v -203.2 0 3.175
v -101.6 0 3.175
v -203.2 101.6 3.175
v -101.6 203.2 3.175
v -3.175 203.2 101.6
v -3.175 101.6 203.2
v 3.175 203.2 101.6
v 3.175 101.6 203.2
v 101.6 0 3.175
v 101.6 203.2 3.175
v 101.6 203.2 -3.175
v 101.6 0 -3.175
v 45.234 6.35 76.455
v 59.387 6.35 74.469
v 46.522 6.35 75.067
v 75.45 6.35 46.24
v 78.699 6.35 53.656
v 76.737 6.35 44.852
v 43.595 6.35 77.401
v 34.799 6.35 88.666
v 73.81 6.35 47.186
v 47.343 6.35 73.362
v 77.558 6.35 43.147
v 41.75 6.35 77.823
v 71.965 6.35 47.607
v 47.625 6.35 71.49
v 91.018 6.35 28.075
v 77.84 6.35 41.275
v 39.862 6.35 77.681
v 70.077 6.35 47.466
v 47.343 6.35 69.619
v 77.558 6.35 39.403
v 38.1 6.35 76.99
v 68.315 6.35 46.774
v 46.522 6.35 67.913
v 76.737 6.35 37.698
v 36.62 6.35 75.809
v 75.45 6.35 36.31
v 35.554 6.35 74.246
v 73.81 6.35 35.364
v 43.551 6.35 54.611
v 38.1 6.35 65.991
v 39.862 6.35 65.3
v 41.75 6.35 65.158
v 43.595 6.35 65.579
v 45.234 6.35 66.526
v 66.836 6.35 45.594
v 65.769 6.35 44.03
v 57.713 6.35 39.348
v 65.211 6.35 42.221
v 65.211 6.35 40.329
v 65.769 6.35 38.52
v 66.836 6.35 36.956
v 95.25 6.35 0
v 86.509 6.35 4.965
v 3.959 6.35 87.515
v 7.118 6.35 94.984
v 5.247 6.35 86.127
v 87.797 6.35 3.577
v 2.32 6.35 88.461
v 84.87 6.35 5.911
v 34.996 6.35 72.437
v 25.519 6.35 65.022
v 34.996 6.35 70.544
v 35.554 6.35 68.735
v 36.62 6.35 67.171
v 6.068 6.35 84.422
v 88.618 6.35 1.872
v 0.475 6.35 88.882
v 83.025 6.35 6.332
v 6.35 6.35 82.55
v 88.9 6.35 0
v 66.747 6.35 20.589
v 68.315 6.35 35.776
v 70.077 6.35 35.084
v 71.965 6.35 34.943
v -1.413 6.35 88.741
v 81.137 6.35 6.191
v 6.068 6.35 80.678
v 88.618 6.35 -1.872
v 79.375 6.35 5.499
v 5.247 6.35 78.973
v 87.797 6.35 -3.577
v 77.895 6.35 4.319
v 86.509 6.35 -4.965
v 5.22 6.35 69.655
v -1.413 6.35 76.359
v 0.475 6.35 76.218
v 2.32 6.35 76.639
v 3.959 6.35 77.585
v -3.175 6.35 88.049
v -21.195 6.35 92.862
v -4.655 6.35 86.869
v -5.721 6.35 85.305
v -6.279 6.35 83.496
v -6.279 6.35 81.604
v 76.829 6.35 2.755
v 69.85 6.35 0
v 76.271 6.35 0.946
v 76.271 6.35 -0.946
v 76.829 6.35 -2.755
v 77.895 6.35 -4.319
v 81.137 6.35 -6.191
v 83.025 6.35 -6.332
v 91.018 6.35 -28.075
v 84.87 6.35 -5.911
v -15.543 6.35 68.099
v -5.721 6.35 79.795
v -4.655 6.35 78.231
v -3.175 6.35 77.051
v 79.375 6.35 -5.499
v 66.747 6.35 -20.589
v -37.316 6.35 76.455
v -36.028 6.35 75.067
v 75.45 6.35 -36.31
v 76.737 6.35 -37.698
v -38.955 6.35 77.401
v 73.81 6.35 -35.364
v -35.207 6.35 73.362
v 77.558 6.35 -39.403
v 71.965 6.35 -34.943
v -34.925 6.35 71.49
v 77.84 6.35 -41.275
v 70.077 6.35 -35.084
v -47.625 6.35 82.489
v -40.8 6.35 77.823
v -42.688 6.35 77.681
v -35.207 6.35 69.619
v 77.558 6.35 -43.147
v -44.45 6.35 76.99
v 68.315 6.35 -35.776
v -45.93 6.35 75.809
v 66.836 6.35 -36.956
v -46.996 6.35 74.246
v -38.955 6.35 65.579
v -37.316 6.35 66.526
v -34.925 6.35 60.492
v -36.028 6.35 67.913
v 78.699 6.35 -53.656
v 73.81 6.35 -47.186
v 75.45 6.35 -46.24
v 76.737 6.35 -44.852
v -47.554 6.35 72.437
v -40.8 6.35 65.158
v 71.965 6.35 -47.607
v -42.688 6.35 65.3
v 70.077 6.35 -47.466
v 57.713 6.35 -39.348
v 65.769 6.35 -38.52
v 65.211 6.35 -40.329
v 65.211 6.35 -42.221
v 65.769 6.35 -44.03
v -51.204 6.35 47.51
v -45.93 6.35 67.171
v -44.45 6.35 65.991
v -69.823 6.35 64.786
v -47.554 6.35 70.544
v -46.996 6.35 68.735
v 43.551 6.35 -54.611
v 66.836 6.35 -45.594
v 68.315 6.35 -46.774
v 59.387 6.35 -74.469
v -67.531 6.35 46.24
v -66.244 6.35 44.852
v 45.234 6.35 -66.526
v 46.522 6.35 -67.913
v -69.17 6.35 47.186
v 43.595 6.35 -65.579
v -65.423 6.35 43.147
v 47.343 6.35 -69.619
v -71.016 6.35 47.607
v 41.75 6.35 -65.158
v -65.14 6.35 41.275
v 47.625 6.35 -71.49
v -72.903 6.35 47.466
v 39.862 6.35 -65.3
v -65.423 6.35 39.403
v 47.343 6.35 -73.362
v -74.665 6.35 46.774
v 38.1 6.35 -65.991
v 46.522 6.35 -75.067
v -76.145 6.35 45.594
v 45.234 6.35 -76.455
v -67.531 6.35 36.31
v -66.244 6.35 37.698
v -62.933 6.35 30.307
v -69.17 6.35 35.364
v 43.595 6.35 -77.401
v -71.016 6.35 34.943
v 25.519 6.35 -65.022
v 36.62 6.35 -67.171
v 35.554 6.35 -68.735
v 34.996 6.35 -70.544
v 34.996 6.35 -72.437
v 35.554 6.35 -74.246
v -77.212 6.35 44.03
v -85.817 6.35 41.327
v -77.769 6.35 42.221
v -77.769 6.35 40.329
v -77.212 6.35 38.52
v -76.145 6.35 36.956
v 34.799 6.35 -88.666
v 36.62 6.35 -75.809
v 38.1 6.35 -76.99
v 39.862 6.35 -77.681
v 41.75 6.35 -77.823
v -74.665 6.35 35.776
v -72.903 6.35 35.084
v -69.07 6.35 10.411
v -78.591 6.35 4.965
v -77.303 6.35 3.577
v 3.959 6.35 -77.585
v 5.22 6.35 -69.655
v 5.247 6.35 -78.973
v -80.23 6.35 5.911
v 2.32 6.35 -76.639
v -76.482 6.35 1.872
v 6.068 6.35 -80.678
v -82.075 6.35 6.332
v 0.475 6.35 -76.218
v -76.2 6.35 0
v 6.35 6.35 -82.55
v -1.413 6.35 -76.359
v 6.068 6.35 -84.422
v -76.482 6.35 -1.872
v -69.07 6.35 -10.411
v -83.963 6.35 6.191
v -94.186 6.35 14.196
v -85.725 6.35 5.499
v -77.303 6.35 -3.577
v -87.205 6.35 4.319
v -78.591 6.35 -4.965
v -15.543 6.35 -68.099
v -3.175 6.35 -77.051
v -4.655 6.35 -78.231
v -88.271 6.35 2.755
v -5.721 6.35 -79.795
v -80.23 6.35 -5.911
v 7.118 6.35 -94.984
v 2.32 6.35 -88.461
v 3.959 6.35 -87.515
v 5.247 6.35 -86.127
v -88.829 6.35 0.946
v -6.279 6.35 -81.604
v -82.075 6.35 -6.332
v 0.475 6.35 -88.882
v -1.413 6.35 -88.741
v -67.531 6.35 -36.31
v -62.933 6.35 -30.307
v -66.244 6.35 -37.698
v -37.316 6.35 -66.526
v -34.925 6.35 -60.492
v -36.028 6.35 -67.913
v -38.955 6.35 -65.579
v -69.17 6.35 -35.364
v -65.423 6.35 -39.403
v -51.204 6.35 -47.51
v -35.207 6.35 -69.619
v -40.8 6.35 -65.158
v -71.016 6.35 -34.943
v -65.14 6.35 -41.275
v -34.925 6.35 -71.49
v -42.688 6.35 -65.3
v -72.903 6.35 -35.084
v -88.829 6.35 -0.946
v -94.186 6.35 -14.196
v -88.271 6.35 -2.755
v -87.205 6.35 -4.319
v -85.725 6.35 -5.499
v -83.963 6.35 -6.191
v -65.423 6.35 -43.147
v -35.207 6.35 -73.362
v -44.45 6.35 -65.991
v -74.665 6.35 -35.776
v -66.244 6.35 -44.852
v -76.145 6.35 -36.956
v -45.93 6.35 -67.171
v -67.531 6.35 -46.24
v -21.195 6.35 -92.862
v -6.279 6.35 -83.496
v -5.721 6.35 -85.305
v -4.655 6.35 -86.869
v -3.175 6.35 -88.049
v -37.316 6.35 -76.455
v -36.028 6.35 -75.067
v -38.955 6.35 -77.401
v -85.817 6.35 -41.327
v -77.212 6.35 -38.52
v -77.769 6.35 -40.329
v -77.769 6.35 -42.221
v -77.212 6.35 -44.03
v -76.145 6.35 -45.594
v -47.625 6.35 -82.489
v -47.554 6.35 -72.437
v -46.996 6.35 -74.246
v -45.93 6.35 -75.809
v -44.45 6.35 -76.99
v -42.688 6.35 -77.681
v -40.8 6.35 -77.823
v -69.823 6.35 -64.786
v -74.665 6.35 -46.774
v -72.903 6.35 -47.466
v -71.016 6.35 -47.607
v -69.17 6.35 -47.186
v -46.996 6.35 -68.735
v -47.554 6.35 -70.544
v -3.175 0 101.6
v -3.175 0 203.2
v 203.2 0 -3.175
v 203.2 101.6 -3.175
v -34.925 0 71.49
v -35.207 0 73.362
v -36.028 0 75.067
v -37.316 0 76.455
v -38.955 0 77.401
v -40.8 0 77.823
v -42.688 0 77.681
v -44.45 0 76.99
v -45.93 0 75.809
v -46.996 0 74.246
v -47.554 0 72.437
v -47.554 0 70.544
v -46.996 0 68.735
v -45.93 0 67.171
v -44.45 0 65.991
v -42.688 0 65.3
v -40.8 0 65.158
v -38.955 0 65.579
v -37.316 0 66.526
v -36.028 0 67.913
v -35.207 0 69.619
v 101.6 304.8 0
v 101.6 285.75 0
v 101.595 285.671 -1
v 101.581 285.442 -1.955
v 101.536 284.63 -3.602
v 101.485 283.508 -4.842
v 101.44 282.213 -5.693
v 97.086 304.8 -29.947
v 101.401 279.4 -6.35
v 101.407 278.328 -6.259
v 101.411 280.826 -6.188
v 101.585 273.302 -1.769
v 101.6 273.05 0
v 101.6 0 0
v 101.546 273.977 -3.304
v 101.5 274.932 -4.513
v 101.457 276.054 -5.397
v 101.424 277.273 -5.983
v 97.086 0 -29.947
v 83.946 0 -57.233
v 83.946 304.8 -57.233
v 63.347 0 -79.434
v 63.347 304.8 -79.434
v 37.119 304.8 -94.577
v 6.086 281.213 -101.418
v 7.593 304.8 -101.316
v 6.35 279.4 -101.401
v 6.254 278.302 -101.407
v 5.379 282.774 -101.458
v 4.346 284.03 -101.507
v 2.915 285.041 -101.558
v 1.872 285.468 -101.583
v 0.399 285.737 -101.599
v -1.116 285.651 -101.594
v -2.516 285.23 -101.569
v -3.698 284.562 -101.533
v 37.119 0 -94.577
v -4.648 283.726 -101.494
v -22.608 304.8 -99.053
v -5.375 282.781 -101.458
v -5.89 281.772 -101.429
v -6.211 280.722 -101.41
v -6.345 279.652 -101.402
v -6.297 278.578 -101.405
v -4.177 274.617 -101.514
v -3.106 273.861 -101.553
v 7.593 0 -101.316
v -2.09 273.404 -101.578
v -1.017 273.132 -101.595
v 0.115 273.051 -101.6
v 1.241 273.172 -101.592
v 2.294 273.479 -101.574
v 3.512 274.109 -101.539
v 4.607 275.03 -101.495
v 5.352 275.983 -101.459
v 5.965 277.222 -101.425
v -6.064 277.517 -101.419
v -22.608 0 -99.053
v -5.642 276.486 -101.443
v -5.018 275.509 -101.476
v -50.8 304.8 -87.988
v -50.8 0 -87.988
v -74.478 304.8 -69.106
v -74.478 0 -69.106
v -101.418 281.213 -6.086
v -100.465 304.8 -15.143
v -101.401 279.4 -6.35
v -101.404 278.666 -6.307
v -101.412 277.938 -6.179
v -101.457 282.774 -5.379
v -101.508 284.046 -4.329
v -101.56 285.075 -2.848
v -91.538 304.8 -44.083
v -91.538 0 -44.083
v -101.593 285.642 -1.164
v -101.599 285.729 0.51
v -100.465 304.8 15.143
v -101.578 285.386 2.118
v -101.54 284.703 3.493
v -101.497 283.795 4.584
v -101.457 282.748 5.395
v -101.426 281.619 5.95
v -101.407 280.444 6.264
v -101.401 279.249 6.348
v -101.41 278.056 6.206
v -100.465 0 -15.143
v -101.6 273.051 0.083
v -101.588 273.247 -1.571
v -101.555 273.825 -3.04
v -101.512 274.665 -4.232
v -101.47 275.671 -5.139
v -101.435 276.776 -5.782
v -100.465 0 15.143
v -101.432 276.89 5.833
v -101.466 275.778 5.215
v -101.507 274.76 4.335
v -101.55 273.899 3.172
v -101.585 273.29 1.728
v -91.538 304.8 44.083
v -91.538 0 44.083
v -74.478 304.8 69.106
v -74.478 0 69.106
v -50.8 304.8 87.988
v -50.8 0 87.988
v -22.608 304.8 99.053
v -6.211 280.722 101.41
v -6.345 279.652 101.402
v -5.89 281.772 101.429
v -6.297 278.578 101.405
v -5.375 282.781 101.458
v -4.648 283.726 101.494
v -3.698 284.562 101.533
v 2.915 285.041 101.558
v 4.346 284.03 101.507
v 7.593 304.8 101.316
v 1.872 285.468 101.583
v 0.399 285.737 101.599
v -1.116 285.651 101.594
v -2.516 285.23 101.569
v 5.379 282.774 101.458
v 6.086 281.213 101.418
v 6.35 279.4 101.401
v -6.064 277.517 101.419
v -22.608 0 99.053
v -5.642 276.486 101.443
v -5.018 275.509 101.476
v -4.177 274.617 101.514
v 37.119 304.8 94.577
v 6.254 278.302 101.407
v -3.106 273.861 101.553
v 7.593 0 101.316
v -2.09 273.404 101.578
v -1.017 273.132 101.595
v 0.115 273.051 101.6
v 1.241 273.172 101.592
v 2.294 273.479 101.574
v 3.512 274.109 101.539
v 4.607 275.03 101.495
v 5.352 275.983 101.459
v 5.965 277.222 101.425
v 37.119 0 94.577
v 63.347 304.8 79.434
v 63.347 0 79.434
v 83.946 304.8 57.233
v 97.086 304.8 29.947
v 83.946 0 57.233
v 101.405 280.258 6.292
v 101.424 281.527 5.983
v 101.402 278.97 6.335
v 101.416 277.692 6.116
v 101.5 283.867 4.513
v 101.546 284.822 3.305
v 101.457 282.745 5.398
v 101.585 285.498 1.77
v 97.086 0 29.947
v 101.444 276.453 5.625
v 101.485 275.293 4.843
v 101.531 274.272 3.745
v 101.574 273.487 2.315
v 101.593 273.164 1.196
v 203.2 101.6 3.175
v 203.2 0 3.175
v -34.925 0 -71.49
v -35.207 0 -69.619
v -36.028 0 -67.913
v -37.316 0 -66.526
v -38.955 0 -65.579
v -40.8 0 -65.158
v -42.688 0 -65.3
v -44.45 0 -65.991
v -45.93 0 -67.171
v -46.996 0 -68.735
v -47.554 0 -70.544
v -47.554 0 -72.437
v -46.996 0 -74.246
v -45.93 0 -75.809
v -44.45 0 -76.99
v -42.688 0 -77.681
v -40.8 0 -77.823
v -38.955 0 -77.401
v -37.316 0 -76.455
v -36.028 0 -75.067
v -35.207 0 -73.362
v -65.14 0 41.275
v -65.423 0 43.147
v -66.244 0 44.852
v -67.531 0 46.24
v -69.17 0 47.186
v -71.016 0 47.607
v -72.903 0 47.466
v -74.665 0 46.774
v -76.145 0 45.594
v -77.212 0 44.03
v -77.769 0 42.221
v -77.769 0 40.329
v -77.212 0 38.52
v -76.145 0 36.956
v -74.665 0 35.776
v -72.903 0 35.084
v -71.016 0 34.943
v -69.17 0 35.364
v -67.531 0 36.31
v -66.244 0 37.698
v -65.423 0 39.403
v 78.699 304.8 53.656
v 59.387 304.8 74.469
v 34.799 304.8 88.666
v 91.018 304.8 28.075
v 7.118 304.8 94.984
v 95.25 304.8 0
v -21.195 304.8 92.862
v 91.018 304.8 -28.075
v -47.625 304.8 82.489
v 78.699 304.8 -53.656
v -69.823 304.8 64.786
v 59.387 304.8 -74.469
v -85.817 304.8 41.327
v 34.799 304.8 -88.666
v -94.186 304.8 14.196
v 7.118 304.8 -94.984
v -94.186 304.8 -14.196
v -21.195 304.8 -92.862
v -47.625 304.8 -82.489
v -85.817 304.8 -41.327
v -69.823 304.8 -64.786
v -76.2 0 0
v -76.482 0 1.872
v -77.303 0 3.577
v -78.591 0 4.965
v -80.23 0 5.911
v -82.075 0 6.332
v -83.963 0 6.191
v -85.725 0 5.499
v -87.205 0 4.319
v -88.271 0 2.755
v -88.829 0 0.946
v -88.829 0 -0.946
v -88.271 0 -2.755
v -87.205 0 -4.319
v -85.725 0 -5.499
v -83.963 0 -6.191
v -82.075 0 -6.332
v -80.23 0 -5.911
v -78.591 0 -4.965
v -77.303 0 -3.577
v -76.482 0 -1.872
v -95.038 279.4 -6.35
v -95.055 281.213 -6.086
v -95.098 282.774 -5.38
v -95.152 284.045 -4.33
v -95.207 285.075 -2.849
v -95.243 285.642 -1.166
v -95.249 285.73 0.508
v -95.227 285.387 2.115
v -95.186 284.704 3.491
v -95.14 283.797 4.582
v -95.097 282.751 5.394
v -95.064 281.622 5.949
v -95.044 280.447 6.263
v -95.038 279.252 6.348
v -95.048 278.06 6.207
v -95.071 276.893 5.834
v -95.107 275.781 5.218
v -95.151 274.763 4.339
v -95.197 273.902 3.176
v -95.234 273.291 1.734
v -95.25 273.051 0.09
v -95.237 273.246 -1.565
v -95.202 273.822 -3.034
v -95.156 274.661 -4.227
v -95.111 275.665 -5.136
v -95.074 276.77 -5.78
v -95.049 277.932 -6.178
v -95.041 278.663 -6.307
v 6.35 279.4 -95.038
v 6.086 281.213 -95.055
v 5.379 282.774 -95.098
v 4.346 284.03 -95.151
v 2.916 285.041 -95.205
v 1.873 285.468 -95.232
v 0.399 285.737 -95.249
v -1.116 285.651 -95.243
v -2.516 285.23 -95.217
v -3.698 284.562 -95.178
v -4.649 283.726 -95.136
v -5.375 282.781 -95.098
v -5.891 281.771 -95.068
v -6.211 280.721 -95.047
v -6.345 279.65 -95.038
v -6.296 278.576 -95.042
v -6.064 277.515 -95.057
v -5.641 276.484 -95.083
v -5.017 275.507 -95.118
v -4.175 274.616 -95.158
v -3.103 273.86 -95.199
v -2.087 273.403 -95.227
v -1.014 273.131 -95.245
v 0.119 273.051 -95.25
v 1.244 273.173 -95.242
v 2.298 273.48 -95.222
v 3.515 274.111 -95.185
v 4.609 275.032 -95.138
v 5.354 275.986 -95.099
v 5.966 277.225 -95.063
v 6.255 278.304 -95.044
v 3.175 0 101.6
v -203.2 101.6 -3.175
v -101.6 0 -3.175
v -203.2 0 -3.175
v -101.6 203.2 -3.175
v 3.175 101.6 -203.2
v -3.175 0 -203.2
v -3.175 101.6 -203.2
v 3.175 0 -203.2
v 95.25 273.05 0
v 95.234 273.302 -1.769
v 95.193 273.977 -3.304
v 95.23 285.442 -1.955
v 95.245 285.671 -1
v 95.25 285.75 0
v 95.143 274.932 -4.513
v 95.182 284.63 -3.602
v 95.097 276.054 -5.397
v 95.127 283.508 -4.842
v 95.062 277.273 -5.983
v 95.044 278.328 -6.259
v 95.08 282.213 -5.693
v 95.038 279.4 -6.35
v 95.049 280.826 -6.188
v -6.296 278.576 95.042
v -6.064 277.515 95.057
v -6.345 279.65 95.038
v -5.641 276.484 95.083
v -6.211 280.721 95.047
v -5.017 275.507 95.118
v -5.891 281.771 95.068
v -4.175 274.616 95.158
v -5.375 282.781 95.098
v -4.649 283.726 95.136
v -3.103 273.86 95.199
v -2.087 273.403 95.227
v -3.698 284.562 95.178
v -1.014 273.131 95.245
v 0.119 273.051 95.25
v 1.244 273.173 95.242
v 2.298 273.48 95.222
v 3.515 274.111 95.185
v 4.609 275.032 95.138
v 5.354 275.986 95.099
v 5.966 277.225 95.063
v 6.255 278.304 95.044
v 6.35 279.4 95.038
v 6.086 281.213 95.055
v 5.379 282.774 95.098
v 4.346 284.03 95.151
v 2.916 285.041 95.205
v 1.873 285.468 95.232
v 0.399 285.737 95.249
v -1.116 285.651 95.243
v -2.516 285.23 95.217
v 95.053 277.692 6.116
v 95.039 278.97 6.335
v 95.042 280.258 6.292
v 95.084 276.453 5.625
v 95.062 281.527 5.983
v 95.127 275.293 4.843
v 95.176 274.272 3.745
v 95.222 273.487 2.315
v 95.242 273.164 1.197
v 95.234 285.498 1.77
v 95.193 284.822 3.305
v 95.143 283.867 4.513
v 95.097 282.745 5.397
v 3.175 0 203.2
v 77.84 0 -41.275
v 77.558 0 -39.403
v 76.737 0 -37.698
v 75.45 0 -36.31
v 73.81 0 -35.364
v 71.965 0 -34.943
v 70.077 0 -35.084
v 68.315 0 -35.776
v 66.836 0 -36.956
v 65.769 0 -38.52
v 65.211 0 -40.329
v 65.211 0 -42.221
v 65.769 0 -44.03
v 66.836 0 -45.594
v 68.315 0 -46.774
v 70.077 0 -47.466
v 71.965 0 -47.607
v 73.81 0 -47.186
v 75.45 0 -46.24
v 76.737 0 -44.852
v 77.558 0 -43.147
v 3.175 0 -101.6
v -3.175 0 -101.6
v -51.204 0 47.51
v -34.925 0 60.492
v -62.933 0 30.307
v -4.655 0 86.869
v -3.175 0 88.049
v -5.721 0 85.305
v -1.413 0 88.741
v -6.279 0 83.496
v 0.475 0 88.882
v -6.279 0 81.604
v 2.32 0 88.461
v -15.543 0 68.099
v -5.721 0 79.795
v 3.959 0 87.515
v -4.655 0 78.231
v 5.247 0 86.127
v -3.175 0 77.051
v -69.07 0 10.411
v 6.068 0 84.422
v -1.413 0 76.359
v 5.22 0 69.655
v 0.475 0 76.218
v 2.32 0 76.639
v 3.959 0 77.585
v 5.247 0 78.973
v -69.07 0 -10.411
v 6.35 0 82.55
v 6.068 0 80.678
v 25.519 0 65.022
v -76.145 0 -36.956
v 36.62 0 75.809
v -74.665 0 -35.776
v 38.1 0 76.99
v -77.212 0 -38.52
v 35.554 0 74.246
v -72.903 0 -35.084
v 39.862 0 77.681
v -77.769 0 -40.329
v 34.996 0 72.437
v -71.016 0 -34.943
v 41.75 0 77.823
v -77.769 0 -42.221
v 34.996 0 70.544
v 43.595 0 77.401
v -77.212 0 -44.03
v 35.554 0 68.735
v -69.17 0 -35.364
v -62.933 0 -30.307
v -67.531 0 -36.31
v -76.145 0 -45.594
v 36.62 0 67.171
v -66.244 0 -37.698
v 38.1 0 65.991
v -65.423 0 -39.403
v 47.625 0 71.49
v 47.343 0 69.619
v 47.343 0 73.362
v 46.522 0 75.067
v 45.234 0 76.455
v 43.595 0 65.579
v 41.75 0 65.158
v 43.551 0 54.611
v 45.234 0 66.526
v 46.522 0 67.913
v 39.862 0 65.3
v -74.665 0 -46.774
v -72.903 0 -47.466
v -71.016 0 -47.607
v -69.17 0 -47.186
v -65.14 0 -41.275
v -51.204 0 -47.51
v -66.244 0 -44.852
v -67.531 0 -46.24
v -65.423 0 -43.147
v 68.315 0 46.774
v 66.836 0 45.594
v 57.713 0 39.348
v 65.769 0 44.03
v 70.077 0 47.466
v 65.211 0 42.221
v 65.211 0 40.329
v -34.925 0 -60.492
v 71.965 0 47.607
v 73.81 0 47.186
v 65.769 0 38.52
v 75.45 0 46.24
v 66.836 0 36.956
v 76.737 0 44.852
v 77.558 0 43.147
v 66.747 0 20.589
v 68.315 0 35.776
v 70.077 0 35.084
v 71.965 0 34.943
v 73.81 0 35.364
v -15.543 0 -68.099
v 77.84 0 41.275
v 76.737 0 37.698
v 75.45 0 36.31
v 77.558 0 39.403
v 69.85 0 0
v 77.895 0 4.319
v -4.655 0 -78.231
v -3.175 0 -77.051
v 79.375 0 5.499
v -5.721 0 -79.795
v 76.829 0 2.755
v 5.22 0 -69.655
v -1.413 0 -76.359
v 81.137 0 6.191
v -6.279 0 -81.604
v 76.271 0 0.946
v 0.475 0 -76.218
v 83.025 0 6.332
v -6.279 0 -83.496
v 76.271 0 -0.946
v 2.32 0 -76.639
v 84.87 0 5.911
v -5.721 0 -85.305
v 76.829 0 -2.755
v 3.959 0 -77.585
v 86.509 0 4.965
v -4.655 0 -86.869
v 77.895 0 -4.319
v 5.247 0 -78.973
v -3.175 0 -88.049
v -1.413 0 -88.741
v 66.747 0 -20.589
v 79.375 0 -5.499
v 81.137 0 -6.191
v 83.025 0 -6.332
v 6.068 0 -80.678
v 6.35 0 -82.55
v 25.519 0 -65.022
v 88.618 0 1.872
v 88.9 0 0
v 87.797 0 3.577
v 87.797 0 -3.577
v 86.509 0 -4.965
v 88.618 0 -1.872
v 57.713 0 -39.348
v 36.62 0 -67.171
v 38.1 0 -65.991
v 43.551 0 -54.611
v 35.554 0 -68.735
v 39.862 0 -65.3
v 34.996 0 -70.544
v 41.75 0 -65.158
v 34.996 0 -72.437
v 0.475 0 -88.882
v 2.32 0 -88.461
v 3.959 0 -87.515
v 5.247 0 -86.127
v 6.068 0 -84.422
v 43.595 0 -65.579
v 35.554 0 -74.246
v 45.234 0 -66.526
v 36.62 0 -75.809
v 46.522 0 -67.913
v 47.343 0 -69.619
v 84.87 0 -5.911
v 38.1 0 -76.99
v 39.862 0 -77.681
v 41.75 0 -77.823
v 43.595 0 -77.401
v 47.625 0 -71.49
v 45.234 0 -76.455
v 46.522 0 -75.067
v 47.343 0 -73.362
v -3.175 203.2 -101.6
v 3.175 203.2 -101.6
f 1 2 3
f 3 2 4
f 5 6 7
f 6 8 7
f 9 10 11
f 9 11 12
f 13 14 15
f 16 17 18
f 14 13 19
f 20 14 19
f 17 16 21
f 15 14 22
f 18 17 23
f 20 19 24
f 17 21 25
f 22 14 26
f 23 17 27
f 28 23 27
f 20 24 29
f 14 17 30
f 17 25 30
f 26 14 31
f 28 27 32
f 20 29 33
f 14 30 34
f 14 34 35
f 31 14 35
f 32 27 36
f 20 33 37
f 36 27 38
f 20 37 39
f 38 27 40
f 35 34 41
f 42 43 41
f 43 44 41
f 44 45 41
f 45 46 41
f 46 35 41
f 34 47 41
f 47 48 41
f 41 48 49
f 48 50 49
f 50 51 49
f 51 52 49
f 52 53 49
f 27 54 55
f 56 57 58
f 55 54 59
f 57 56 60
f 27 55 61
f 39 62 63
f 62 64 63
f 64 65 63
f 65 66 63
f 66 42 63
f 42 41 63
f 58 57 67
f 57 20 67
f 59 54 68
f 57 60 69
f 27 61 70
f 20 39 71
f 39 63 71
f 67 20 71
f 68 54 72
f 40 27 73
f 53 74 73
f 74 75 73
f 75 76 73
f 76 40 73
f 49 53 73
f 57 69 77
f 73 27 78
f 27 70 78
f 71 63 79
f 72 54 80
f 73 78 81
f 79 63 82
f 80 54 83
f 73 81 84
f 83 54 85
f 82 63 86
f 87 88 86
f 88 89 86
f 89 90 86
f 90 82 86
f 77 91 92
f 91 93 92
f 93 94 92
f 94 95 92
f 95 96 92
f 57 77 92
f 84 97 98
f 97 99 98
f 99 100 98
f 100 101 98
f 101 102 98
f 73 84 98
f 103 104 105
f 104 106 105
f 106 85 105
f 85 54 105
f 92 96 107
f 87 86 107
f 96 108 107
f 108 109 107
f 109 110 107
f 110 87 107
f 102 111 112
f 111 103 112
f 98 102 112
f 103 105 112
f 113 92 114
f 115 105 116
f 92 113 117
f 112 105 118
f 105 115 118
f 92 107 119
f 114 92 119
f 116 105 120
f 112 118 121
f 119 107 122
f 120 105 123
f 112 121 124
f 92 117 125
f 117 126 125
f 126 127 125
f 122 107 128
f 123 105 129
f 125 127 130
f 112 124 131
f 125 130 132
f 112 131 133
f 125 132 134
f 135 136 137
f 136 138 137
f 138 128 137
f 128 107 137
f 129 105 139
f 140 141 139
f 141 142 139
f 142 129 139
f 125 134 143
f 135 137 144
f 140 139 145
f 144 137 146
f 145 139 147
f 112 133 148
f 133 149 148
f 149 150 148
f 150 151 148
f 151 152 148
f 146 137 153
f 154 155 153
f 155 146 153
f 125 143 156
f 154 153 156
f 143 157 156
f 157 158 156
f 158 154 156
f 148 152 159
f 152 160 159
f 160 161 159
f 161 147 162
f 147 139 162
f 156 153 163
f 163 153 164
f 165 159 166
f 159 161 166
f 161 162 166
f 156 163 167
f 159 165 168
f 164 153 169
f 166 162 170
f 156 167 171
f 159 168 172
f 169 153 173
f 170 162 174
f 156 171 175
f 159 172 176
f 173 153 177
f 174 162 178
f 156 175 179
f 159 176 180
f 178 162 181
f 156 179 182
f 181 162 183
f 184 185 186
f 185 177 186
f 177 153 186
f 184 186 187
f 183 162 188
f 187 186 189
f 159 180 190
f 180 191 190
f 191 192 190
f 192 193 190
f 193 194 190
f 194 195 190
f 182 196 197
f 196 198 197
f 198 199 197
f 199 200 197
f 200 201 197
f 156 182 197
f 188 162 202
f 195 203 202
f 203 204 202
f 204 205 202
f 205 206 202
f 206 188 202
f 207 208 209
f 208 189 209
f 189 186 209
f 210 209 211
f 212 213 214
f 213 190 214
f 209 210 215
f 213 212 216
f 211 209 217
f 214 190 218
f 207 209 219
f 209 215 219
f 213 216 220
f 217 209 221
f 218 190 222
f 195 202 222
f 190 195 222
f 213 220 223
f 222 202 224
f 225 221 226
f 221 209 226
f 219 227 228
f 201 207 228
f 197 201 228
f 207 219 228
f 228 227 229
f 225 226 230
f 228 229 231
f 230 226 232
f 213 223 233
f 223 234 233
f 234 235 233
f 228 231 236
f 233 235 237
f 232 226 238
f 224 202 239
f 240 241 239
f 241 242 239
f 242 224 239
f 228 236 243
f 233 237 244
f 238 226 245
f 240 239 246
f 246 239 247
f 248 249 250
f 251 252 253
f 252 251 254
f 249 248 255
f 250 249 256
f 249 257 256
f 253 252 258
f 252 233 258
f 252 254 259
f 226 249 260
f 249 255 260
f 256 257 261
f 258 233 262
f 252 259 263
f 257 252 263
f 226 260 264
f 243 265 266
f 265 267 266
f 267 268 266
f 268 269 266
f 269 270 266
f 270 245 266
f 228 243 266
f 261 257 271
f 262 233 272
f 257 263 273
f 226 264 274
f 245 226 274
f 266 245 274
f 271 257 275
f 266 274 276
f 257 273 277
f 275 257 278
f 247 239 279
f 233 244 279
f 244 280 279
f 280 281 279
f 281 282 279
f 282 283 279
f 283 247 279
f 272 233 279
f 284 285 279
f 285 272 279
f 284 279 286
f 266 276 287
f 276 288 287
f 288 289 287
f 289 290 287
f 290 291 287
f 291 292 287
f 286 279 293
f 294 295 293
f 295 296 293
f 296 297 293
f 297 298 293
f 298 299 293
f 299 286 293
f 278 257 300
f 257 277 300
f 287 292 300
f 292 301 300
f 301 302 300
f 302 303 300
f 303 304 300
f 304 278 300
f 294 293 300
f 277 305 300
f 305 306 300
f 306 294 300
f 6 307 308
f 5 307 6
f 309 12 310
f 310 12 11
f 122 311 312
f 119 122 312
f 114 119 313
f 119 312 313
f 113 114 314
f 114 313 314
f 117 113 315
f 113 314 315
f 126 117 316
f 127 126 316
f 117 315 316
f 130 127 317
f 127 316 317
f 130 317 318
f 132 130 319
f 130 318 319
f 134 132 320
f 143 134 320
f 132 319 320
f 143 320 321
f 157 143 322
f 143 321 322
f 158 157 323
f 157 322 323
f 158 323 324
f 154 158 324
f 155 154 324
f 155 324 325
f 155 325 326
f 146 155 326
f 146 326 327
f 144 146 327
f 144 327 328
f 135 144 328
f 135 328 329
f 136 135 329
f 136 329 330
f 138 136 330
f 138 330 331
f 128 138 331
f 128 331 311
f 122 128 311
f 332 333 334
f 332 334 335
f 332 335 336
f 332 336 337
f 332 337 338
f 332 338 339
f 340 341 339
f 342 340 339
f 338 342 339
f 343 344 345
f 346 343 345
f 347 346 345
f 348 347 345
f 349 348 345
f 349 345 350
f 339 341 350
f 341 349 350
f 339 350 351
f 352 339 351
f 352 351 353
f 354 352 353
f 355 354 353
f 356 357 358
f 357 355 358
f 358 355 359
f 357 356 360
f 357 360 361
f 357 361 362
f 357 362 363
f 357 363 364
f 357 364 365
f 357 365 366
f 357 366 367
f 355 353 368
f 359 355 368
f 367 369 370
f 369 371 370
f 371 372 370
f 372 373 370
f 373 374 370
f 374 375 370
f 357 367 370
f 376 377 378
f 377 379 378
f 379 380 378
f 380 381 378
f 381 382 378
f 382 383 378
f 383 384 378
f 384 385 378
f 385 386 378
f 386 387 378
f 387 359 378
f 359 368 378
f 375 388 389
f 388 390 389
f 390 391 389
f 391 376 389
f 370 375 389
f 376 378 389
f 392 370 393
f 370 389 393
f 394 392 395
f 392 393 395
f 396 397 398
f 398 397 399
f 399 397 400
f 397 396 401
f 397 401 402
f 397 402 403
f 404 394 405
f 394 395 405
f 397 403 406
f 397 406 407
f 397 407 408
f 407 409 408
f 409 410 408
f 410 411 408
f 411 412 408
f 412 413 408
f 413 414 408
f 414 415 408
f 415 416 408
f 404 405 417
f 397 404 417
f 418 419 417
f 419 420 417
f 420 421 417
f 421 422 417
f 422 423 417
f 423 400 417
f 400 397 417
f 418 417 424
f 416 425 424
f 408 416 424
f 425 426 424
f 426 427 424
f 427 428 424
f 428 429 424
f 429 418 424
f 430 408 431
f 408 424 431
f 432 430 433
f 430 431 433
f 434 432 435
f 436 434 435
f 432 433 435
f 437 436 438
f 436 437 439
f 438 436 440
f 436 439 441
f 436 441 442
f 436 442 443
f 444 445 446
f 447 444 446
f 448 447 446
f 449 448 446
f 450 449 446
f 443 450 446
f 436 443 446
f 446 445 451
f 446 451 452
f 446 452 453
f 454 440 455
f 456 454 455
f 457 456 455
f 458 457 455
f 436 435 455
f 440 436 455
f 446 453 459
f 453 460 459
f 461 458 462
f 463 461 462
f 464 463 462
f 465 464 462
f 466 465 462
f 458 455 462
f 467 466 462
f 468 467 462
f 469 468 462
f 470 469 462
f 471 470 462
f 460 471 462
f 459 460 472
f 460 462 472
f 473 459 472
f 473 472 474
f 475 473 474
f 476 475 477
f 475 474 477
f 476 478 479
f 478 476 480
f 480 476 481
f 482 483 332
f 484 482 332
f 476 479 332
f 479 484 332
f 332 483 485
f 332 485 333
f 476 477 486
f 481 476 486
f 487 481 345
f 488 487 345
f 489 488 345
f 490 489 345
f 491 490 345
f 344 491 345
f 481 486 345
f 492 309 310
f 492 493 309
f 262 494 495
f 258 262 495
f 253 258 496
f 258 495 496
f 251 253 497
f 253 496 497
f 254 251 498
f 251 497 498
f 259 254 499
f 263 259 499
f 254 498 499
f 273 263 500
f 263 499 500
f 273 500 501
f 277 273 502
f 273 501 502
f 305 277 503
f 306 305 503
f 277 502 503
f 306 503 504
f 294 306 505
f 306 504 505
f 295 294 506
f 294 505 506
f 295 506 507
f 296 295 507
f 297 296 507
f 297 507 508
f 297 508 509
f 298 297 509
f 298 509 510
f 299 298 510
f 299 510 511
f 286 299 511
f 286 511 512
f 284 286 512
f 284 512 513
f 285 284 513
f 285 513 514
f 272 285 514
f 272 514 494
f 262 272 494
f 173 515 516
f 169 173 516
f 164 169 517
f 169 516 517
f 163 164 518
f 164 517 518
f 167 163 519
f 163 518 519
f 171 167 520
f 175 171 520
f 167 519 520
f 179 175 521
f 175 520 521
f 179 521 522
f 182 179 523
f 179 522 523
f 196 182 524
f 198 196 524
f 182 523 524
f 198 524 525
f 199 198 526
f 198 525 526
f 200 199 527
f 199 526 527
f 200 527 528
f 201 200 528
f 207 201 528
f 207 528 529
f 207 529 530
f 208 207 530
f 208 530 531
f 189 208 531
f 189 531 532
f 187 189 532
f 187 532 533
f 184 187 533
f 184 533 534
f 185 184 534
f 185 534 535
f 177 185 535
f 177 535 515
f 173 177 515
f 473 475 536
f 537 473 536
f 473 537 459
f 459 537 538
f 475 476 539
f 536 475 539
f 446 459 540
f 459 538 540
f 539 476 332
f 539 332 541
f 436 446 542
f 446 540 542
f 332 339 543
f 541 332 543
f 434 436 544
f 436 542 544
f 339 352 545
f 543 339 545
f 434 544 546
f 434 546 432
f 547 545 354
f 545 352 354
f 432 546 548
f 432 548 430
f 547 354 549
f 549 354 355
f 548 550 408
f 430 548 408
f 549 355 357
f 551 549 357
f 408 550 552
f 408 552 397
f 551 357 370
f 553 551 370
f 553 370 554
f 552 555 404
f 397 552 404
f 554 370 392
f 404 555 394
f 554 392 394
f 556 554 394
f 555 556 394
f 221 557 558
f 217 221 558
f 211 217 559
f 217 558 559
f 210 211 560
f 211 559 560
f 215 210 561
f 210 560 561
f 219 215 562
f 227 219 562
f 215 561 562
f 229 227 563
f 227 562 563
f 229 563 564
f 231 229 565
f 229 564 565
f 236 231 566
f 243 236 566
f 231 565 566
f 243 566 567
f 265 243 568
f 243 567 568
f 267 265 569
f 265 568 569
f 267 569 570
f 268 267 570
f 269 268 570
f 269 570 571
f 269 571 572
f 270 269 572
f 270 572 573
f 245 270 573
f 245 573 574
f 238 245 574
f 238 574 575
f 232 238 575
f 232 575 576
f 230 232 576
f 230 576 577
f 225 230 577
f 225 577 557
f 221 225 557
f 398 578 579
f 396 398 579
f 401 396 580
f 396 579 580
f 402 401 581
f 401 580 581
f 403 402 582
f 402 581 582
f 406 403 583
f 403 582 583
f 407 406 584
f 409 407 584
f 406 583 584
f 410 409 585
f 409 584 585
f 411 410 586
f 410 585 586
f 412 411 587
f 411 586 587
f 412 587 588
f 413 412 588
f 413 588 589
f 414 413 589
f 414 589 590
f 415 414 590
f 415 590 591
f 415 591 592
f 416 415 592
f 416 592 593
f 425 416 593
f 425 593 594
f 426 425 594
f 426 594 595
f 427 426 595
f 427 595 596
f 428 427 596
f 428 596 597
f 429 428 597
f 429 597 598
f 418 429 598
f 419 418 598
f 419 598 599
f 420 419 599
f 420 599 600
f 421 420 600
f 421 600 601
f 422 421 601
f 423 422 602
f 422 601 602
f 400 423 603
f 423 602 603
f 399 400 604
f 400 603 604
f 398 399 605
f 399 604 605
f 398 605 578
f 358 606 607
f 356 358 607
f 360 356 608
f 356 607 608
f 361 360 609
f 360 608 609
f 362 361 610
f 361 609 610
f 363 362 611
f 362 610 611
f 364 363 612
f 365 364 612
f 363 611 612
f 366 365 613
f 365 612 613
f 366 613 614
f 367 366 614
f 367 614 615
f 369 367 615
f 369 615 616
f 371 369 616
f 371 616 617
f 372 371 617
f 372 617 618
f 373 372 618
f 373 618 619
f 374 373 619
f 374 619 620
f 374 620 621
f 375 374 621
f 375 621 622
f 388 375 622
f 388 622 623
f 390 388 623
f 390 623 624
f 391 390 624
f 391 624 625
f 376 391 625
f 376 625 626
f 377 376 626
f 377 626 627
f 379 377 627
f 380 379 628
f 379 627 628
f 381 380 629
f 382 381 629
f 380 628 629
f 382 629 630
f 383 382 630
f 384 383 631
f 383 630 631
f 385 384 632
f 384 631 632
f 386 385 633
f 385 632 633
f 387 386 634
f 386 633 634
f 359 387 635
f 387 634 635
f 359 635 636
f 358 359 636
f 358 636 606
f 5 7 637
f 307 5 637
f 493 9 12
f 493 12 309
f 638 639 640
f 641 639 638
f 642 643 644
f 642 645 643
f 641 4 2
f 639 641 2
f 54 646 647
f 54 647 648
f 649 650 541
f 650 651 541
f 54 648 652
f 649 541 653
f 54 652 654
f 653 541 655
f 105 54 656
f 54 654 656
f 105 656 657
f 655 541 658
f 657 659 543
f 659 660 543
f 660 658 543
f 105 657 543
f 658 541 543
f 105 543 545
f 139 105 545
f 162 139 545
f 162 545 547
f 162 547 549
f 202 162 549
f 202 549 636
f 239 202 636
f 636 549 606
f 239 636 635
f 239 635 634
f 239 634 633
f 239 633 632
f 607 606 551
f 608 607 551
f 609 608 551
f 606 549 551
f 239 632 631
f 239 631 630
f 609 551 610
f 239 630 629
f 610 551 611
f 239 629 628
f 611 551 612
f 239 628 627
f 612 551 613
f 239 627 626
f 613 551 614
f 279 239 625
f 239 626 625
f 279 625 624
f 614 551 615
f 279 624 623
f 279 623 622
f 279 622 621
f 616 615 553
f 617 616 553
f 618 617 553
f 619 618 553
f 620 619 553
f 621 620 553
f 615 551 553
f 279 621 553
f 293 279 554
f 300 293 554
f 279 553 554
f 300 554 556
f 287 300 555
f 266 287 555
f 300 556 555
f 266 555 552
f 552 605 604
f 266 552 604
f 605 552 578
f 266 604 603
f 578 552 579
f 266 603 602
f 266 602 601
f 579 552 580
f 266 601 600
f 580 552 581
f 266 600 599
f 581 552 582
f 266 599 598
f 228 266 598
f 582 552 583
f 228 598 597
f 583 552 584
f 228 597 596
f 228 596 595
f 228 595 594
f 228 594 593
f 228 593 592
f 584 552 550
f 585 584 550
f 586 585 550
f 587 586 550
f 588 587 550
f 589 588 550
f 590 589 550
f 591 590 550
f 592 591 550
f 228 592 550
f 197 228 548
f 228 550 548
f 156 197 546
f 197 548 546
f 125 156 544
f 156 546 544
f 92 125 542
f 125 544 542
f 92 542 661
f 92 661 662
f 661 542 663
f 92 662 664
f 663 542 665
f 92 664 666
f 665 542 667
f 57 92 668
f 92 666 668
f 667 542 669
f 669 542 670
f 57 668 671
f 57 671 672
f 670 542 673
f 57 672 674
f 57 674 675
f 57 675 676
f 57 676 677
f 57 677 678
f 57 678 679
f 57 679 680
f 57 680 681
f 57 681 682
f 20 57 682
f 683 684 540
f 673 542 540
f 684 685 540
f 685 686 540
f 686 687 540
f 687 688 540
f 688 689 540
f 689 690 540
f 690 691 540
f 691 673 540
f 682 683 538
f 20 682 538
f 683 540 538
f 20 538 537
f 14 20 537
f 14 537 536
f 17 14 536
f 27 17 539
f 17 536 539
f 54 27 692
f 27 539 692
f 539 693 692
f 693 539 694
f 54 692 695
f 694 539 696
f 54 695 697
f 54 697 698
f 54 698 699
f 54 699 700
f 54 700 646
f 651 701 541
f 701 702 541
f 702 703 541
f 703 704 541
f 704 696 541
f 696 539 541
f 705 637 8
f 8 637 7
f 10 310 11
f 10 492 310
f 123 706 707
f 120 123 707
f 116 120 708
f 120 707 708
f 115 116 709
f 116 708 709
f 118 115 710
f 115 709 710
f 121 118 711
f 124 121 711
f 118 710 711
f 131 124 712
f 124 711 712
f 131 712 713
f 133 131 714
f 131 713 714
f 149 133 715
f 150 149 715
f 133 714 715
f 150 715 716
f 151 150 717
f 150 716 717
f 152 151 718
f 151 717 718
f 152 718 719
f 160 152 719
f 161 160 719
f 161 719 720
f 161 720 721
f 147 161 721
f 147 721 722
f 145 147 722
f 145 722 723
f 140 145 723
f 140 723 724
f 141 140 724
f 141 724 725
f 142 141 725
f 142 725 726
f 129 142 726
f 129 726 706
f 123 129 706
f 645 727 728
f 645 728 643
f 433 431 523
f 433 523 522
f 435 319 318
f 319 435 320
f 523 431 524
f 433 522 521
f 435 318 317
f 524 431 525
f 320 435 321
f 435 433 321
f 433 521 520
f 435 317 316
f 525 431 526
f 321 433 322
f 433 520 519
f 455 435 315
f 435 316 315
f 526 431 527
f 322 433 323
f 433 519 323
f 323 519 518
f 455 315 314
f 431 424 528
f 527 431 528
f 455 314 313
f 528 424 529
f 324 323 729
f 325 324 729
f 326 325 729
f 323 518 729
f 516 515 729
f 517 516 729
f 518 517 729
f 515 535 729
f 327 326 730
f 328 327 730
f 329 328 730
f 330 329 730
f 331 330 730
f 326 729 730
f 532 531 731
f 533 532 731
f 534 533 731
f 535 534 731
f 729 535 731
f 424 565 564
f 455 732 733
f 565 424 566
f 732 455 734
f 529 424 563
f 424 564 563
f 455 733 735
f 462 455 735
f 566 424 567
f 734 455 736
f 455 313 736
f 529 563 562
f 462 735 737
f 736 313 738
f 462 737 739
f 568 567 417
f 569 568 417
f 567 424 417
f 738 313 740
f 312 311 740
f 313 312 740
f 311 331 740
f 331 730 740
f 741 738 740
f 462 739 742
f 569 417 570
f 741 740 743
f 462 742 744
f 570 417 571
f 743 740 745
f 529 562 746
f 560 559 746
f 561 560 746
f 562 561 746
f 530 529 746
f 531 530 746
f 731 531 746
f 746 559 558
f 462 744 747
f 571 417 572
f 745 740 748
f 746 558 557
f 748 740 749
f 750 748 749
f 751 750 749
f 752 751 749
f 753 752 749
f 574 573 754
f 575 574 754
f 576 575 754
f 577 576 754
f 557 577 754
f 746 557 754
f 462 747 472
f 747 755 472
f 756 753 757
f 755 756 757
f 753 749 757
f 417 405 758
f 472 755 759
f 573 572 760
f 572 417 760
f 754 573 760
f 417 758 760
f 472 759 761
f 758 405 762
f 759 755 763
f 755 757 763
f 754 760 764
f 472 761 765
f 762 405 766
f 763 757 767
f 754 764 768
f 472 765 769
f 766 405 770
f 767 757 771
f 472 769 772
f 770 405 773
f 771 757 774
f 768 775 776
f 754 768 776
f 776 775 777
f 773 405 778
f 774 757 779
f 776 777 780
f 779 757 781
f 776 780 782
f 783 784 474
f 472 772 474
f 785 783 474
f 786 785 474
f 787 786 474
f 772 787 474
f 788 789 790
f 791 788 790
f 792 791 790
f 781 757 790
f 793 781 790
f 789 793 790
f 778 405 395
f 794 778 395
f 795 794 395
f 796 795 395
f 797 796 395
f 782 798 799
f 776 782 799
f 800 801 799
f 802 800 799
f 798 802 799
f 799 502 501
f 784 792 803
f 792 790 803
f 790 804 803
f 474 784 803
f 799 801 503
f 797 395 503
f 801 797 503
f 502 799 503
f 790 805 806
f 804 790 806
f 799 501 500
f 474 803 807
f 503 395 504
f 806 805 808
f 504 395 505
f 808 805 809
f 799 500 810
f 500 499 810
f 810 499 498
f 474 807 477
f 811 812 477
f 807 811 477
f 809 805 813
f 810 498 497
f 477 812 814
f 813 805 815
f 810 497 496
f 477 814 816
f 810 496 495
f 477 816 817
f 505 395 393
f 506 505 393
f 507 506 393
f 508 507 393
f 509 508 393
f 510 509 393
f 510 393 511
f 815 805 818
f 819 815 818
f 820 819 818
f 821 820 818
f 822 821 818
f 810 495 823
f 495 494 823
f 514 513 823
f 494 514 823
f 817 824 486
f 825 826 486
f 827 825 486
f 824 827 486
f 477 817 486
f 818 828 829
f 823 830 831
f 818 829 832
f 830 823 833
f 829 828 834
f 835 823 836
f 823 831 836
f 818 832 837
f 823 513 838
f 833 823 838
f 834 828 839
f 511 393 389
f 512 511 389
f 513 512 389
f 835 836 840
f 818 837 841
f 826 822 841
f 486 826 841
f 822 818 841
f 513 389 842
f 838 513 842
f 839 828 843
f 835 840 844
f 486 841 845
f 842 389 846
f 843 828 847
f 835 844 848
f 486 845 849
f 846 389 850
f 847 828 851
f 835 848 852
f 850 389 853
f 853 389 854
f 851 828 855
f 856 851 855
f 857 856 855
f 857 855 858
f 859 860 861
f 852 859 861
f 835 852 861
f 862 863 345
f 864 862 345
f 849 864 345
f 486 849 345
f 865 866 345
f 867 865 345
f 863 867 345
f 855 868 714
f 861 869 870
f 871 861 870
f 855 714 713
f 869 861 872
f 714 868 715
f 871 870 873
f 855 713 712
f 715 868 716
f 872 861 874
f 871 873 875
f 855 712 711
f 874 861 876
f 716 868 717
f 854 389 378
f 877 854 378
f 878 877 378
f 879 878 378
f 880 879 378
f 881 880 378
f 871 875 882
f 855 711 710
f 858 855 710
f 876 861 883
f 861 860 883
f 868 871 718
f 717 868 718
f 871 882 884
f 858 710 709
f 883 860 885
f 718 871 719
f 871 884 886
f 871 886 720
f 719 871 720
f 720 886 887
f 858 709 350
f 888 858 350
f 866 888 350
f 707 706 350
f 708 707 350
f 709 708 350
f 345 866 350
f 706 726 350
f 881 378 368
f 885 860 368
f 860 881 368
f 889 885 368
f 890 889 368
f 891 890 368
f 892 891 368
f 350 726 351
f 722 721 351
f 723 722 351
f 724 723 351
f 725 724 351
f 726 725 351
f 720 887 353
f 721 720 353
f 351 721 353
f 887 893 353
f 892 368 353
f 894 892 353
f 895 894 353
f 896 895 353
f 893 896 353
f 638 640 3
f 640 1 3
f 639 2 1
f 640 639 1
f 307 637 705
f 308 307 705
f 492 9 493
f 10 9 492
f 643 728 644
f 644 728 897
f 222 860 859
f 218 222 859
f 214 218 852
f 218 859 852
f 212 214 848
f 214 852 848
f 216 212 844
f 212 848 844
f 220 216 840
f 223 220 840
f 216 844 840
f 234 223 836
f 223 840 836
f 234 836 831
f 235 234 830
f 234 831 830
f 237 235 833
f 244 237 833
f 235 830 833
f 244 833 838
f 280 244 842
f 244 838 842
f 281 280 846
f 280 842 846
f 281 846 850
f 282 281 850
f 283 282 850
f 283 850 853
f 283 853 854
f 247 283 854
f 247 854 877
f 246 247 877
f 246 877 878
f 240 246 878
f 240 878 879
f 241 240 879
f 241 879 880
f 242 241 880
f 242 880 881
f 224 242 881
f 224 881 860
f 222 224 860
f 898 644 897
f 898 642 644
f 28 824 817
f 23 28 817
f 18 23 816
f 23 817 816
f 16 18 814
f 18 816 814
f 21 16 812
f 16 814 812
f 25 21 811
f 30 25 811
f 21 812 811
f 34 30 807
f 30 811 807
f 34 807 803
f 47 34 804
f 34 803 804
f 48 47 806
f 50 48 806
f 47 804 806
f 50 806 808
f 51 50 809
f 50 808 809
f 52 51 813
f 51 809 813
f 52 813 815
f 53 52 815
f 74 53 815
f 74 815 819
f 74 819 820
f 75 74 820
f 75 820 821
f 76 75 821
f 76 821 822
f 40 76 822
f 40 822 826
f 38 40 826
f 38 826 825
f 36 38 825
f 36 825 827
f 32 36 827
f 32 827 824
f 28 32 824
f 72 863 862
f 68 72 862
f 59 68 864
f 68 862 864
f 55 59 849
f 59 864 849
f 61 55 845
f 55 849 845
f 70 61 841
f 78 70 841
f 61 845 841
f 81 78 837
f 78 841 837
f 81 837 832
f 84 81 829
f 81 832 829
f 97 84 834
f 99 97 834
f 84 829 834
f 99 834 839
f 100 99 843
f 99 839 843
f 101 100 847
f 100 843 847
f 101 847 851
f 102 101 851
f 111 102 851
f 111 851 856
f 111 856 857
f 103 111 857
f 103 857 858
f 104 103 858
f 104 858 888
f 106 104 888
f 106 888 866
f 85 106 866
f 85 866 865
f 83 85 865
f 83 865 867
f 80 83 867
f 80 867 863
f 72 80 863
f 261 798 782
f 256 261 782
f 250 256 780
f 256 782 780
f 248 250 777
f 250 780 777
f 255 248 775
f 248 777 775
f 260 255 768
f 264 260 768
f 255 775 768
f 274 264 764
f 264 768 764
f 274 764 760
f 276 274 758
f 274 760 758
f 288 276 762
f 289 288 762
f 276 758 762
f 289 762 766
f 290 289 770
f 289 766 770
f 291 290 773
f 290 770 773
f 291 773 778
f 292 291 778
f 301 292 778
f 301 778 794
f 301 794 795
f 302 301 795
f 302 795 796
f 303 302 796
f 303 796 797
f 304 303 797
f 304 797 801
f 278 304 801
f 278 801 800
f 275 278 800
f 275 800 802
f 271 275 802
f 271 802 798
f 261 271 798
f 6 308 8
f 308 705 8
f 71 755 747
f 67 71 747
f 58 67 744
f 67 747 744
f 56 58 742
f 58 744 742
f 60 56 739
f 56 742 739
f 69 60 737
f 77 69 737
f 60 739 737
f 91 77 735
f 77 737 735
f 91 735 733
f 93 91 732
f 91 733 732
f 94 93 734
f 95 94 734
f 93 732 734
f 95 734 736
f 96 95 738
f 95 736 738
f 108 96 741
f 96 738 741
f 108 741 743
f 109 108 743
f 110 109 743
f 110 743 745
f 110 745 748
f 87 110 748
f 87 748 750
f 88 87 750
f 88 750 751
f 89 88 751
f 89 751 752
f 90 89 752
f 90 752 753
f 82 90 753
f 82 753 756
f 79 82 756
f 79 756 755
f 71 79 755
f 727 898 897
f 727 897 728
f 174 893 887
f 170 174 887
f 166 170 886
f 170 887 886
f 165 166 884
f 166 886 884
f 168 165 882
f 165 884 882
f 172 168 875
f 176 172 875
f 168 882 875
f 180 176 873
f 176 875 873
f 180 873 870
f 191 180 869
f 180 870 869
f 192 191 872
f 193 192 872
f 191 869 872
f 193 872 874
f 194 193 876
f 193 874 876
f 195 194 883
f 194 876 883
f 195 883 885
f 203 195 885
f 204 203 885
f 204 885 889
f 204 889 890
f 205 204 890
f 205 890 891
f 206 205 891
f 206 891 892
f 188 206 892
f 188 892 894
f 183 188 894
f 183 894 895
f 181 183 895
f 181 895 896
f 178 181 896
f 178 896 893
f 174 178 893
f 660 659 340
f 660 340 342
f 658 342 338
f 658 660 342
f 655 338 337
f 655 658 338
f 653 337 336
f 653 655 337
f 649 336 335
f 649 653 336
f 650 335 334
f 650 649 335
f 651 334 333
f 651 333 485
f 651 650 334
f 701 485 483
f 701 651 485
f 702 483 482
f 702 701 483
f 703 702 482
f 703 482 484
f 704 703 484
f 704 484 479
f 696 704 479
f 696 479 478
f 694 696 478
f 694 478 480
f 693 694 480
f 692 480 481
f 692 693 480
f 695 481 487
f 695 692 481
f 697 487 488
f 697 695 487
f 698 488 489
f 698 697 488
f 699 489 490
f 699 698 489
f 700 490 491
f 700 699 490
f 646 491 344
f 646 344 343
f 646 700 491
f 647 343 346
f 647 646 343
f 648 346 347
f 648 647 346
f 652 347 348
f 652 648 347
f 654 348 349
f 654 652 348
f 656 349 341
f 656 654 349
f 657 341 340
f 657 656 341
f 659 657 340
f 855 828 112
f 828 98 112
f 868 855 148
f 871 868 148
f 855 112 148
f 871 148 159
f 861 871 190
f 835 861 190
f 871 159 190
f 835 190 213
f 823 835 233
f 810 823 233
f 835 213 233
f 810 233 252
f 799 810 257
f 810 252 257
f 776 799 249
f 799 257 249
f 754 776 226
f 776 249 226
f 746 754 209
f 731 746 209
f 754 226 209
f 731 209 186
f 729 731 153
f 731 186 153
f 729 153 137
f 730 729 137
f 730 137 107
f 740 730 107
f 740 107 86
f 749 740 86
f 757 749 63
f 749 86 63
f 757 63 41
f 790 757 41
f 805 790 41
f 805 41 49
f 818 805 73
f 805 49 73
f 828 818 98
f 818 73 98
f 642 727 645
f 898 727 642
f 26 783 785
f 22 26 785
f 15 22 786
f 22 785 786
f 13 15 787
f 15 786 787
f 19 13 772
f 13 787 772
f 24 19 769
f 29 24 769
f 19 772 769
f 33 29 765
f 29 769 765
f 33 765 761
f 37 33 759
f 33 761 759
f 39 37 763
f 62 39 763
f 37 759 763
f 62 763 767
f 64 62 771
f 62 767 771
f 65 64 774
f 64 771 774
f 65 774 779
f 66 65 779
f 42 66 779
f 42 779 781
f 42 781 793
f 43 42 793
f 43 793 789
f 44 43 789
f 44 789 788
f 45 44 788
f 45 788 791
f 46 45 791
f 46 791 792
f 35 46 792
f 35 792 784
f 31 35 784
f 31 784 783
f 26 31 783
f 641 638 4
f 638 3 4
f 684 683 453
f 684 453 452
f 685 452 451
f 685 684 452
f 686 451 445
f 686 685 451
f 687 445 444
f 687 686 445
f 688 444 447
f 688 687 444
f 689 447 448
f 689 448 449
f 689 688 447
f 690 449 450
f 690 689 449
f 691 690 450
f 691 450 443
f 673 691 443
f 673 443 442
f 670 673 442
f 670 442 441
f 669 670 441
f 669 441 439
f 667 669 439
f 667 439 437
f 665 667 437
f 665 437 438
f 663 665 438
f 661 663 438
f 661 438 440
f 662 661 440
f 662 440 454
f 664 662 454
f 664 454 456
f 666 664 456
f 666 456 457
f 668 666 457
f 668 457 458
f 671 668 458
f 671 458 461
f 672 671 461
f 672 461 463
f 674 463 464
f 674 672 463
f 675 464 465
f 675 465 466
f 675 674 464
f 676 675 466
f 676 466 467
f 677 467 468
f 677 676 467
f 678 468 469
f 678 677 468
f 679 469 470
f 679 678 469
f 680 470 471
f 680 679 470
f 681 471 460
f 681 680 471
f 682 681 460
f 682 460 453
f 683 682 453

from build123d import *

# Parameters (mm, degrees)
SKETCH2_R               = 6.35
CUT_EXTRUDE1_DEPTH      = 305.8
BOSS_EXTRUDE1_DEPTH     = 3.175
BOSS_EXTRUDE1_2_DEPTH   = 3.175
BOSS_EXTRUDE3_DEPTH     = 3.175
BOSS_EXTRUDE3_2_DEPTH   = 3.175
SKETCH5_R               = 6.35
CUT_EXTRUDE2_DEPTH      = 204.2
CUT_EXTRUDE2_DEPTH_BACK = 204.2
SKETCH6_R               = 6.35
CUT_EXTRUDE3_DEPTH      = 204.2
CUT_EXTRUDE3_DEPTH_BACK = 204.2


with BuildPart() as part:
    # Sketch1 → Revolve1 (revolve)
    with BuildSketch(Plane.XY):
        Polygon((95.25, 6.35), (95.25, 304.8), (101.6, 304.8), (101.6, 0), (69.85, 0), (69.85, 6.35), align=None)
    revolve(axis=Axis((0, 0, 0), (0, 1, 0)))

    # Sketch2 → Cut-Extrude1 (cut, through all)
    with BuildSketch(Plane.XZ):
        with Locations((0, 82.55)):
            Circle(SKETCH2_R)
        with Locations((41.275, 71.490397082)):
            Circle(SKETCH2_R)
        with Locations((71.490397082, 41.275)):
            Circle(SKETCH2_R)
        with Locations((82.55, 0)):
            Circle(SKETCH2_R)
        with Locations((71.490397082, -41.275)):
            Circle(SKETCH2_R)
        with Locations((41.275, -71.490397082)):
            Circle(SKETCH2_R)
        with Locations((0, -82.55)):
            Circle(SKETCH2_R)
        with Locations((-41.275, -71.490397082)):
            Circle(SKETCH2_R)
        with Locations((-71.490397082, -41.275)):
            Circle(SKETCH2_R)
        with Locations((-82.55, 0)):
            Circle(SKETCH2_R)
        with Locations((-71.490397082, 41.275)):
            Circle(SKETCH2_R)
        with Locations((-41.275, 71.490397082)):
            Circle(SKETCH2_R)
    extrude(amount=-CUT_EXTRUDE1_DEPTH, mode=Mode.SUBTRACT)

    # Sketch5 → Cut-Extrude2 (cut, two sides)
    with BuildSketch(Plane.XY) as cut_extrude2_sk:
        with Locations((0, 279.4)):
            Circle(SKETCH5_R)
    extrude(amount=CUT_EXTRUDE2_DEPTH, mode=Mode.SUBTRACT)
    extrude(cut_extrude2_sk.sketch, amount=-CUT_EXTRUDE2_DEPTH_BACK, mode=Mode.SUBTRACT)

    # Sketch6 → Cut-Extrude3 (cut, two sides)
    with BuildSketch(Plane(origin=(0, 0, 0), x_dir=(0, 0, -1), z_dir=(1, 0, 0))) as cut_extrude3_sk:
        with Locations((0, 279.4)):
            Circle(SKETCH6_R)
    extrude(amount=CUT_EXTRUDE3_DEPTH, mode=Mode.SUBTRACT)
    extrude(cut_extrude3_sk.sketch, amount=-CUT_EXTRUDE3_DEPTH_BACK, mode=Mode.SUBTRACT)


with BuildPart() as body_2:
    # Sketch3 → Boss-Extrude1 (new body, symmetric)
    with BuildSketch(Plane.XY):
        Polygon((-101.6, 0), (-203.2, 0), (-203.2, 101.6), (-101.6, 203.2), align=None)
    extrude(amount=BOSS_EXTRUDE1_DEPTH, both=True)


with BuildPart() as body_3:
    # Sketch3 → Boss-Extrude1 2 (new body, symmetric)
    with BuildSketch(Plane.XY):
        Polygon((203.2, 101.6), (101.6, 203.2), (101.6, 0), (203.2, 0), align=None)
    extrude(amount=BOSS_EXTRUDE1_2_DEPTH, both=True)


with BuildPart() as body_4:
    # Sketch4 → Boss-Extrude3 (new body, symmetric)
    with BuildSketch(Plane(origin=(0, 0, 0), x_dir=(0, 0, -1), z_dir=(1, 0, 0))):
        Polygon((-101.6, 0), (-203.2, 0), (-203.2, 101.6), (-101.6, 203.2), align=None)
    extrude(amount=BOSS_EXTRUDE3_DEPTH, both=True)


with BuildPart() as body_5:
    # Sketch4 → Boss-Extrude3 2 (new body, symmetric)
    with BuildSketch(Plane(origin=(0, 0, 0), x_dir=(0, 0, -1), z_dir=(1, 0, 0))):
        Polygon((203.2, 101.6), (101.6, 203.2), (101.6, 0), (203.2, 0), align=None)
    extrude(amount=BOSS_EXTRUDE3_2_DEPTH, both=True)


solid = Compound([part.part, body_2.part, body_3.part, body_4.part, body_5.part])
